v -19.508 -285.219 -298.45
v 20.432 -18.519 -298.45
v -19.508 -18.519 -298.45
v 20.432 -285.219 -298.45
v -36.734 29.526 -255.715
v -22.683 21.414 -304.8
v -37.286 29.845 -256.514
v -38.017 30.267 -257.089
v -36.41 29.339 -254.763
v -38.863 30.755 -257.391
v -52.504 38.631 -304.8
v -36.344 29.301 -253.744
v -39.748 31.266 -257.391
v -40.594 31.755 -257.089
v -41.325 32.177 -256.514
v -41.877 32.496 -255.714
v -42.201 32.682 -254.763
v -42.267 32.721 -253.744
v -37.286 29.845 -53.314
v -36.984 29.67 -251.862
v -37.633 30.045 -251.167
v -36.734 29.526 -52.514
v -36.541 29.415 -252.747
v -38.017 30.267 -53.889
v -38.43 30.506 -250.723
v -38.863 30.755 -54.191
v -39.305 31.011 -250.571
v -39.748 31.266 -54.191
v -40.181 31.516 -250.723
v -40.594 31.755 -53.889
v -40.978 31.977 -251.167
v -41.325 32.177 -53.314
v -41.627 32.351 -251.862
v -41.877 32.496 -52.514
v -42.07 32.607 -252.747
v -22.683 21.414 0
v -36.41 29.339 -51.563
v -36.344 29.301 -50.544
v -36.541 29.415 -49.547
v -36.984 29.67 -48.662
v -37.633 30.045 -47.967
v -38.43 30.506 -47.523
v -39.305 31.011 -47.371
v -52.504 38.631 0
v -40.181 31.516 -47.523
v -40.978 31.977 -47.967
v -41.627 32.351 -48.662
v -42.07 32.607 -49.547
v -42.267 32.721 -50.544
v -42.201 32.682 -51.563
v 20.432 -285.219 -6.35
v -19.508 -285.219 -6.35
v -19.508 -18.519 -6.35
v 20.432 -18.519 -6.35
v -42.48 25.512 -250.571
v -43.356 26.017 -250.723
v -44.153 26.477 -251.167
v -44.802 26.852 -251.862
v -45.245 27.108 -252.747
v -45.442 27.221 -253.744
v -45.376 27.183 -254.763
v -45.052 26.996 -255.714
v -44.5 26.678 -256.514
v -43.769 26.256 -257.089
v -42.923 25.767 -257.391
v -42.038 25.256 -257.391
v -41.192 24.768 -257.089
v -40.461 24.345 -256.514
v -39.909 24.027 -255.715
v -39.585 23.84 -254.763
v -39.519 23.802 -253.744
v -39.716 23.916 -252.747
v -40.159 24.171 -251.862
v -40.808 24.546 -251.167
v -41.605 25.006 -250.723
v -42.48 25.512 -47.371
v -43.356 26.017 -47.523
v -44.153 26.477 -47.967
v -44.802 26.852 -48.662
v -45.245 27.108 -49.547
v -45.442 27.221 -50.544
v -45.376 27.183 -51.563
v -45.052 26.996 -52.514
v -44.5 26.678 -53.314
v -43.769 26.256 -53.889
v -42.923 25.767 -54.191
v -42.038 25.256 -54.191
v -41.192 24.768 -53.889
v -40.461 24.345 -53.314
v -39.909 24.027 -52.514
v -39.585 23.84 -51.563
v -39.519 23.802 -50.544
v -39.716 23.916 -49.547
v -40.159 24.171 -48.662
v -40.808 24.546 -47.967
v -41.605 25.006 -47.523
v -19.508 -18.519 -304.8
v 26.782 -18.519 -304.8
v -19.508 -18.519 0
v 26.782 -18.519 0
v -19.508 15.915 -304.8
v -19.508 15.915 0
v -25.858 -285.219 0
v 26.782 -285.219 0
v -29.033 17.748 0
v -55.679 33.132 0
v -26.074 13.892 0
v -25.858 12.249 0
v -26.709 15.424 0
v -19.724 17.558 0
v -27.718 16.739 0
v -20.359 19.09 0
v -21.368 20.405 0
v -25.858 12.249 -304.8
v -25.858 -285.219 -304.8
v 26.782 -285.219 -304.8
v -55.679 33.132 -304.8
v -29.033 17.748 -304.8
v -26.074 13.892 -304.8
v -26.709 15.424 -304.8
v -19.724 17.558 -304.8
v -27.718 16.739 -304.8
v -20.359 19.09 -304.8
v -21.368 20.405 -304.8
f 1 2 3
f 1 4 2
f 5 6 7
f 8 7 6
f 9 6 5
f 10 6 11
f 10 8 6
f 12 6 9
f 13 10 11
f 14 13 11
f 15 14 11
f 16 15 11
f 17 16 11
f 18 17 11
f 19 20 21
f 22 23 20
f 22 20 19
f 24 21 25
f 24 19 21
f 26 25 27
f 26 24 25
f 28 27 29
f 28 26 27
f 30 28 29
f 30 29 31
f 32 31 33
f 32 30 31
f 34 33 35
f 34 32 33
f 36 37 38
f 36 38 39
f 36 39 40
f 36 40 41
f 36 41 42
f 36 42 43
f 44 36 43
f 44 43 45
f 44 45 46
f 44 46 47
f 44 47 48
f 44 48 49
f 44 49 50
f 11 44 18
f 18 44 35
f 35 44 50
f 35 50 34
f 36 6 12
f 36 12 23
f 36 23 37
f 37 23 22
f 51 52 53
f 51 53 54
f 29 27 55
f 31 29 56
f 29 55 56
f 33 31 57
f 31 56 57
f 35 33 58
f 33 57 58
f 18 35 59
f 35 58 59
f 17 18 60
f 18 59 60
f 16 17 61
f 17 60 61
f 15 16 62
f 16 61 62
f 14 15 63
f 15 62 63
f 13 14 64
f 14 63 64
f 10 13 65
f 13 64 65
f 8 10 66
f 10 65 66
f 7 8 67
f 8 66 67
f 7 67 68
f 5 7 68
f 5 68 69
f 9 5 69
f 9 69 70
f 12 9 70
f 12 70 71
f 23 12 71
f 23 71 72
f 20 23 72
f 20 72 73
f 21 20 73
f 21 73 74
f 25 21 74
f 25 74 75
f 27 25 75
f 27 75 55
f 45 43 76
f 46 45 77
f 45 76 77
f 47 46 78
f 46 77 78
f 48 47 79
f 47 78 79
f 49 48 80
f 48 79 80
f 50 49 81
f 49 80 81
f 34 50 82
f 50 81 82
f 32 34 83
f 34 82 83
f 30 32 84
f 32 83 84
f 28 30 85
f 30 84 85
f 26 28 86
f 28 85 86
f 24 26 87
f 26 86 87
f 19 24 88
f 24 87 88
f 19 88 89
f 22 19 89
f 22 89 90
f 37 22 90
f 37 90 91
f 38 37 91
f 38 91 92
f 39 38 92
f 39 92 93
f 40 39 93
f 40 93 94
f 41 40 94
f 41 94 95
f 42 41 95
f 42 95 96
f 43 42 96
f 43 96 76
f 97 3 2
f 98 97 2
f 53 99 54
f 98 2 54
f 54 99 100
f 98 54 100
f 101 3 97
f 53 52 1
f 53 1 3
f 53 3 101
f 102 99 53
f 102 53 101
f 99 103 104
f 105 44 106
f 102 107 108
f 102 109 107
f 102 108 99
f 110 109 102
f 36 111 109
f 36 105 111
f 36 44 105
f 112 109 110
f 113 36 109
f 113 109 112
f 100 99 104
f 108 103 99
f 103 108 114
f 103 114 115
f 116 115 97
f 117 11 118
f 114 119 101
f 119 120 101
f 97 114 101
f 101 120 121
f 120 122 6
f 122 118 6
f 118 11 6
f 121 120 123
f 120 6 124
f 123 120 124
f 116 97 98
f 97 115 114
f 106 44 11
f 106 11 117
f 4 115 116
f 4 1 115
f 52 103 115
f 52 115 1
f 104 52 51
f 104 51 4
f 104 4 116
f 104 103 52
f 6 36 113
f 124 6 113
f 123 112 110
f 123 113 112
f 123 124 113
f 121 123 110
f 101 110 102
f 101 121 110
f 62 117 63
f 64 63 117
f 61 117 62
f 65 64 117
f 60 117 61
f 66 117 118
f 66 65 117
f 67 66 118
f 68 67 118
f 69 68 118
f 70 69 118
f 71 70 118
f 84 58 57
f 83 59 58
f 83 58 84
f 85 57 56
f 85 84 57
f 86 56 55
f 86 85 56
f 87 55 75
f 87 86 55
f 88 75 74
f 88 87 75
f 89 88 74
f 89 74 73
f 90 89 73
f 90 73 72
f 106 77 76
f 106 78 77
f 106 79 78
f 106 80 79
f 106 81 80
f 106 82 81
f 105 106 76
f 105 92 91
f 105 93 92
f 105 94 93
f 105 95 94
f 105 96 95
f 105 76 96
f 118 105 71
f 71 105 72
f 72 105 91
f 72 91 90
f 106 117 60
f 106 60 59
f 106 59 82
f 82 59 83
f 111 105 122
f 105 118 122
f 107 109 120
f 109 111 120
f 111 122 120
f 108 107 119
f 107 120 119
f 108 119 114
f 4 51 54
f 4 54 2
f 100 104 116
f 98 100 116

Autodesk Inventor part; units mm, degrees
ref_plane "YZ Plane" through (0, 0, 0) normal (1, 0, 0) x (0, 1, 0)
ref_plane "XZ Plane" through (0, 0, 0) normal (0, 1, 0) x (-1, 0, 0)
sketch "Sketch1" plane through (0, 0, 0) normal (0, 0, 1) x (1, 0, 0)
  line L0 (-19.508, -285.2191) -> (-19.508, 19.5809)
  line L1 (-19.508, 19.5809) -> (-52.5036, 38.6309)
  line L2 (-52.5036, 38.6309) -> (-55.6786, 33.1316)
  line L3 (-19.508, 19.5809) -> (-25.858, 15.9147)
  line L4 (-55.6786, 33.1316) -> (-25.858, 15.9147)
  line L5 (-25.858, 15.9147) -> (-25.858, -285.2191)
  line L6 (-25.858, -285.2191) -> (-19.508, -285.2191)
  point P0 (0, 0)
  dimension "d0" = 120
  dimension "d1" = 304.8
  dimension "d2" = 38.1
  dimension "d4" = 6.35
extrude "Extrusion1" add sketch "Sketch1" against normal blind 304.8
fillet "Fillet1" radius 6.35 2 edges at (-19.508, 19.5809, -152.4) (-25.858, 15.9147, -152.4)
sketch "Sketch2" plane through (-52.5036, 38.6309, 0) normal (0.5, 0.8660254, 0) x (0.8660254, -0.5, 0)
  line L0 (0, 0) -> (0, 304.8) projected
  line L1 (34.4338, 0) -> (0, 0) projected
  point P0 (64.7849, 0)
  point P1 (15.24, 50.8)
  point P2 (15.24, 254)
  dimension "d8" = 50.8
  dimension "d10" = 254
  dimension "d11" = 15.24
  dimension "d12" = 15.24
hole "Hole1" at (-39.3054, 31.0109, -50.8) at (-39.3054, 31.0109, -254) direction (-0.5, -0.8660254, 0) diameter 6.858 depth 25.4 tip angle 118
sketch "Sketch3" plane through (-25.858, -285.2191, 0) normal (0, -1, 0) x (1, 0, 0)
  line L0 (0, -304.8) -> (6.35, -304.8) projected
  line L1 (6.35, 0) -> (6.35, -304.8) projected
  line L2 (0, 0) -> (6.35, 0) projected
  line L3 (0, 0) -> (0, -304.8) projected
  line L4 (6.35, 0) -> (52.6401, 0)
  line L5 (52.6401, 0) -> (52.6401, -304.8)
  line L6 (52.6401, -304.8) -> (6.35, -304.8)
  line L7 (6.35, -304.8) -> (6.35, 0)
  line L8 (6.35, -6.35) -> (46.2901, -6.35)
  line L9 (46.2901, -6.35) -> (46.2901, -298.45)
  line L10 (46.2901, -298.45) -> (6.35, -298.45)
  line L11 (6.35, -298.45) -> (6.35, -6.35)
  point P0 (25.858, 0)
  dimension "d20" = 6.35
  dimension "d21" = 6.35
  dimension "d22" = 6.35
ref_plane "Work Plane1" through (-22.683, 21.414, 0) normal (0.5, 0.8660254, 0) x (-0.8660254, 0.5, 0)
extrude "Extrusion2" add sketch "Sketch3" against normal blind 266.7 contours L1 L10 L9 L8 L4 L5 L6
thread "Thread1" size "5/16-18 UNC" class "2B" standard "ANSI Unified Screw Threads" full length
thread "Thread2" size "5/16-18 UNC" class "2B" standard "ANSI Unified Screw Threads" full length
properties part number "slideFeeder"
